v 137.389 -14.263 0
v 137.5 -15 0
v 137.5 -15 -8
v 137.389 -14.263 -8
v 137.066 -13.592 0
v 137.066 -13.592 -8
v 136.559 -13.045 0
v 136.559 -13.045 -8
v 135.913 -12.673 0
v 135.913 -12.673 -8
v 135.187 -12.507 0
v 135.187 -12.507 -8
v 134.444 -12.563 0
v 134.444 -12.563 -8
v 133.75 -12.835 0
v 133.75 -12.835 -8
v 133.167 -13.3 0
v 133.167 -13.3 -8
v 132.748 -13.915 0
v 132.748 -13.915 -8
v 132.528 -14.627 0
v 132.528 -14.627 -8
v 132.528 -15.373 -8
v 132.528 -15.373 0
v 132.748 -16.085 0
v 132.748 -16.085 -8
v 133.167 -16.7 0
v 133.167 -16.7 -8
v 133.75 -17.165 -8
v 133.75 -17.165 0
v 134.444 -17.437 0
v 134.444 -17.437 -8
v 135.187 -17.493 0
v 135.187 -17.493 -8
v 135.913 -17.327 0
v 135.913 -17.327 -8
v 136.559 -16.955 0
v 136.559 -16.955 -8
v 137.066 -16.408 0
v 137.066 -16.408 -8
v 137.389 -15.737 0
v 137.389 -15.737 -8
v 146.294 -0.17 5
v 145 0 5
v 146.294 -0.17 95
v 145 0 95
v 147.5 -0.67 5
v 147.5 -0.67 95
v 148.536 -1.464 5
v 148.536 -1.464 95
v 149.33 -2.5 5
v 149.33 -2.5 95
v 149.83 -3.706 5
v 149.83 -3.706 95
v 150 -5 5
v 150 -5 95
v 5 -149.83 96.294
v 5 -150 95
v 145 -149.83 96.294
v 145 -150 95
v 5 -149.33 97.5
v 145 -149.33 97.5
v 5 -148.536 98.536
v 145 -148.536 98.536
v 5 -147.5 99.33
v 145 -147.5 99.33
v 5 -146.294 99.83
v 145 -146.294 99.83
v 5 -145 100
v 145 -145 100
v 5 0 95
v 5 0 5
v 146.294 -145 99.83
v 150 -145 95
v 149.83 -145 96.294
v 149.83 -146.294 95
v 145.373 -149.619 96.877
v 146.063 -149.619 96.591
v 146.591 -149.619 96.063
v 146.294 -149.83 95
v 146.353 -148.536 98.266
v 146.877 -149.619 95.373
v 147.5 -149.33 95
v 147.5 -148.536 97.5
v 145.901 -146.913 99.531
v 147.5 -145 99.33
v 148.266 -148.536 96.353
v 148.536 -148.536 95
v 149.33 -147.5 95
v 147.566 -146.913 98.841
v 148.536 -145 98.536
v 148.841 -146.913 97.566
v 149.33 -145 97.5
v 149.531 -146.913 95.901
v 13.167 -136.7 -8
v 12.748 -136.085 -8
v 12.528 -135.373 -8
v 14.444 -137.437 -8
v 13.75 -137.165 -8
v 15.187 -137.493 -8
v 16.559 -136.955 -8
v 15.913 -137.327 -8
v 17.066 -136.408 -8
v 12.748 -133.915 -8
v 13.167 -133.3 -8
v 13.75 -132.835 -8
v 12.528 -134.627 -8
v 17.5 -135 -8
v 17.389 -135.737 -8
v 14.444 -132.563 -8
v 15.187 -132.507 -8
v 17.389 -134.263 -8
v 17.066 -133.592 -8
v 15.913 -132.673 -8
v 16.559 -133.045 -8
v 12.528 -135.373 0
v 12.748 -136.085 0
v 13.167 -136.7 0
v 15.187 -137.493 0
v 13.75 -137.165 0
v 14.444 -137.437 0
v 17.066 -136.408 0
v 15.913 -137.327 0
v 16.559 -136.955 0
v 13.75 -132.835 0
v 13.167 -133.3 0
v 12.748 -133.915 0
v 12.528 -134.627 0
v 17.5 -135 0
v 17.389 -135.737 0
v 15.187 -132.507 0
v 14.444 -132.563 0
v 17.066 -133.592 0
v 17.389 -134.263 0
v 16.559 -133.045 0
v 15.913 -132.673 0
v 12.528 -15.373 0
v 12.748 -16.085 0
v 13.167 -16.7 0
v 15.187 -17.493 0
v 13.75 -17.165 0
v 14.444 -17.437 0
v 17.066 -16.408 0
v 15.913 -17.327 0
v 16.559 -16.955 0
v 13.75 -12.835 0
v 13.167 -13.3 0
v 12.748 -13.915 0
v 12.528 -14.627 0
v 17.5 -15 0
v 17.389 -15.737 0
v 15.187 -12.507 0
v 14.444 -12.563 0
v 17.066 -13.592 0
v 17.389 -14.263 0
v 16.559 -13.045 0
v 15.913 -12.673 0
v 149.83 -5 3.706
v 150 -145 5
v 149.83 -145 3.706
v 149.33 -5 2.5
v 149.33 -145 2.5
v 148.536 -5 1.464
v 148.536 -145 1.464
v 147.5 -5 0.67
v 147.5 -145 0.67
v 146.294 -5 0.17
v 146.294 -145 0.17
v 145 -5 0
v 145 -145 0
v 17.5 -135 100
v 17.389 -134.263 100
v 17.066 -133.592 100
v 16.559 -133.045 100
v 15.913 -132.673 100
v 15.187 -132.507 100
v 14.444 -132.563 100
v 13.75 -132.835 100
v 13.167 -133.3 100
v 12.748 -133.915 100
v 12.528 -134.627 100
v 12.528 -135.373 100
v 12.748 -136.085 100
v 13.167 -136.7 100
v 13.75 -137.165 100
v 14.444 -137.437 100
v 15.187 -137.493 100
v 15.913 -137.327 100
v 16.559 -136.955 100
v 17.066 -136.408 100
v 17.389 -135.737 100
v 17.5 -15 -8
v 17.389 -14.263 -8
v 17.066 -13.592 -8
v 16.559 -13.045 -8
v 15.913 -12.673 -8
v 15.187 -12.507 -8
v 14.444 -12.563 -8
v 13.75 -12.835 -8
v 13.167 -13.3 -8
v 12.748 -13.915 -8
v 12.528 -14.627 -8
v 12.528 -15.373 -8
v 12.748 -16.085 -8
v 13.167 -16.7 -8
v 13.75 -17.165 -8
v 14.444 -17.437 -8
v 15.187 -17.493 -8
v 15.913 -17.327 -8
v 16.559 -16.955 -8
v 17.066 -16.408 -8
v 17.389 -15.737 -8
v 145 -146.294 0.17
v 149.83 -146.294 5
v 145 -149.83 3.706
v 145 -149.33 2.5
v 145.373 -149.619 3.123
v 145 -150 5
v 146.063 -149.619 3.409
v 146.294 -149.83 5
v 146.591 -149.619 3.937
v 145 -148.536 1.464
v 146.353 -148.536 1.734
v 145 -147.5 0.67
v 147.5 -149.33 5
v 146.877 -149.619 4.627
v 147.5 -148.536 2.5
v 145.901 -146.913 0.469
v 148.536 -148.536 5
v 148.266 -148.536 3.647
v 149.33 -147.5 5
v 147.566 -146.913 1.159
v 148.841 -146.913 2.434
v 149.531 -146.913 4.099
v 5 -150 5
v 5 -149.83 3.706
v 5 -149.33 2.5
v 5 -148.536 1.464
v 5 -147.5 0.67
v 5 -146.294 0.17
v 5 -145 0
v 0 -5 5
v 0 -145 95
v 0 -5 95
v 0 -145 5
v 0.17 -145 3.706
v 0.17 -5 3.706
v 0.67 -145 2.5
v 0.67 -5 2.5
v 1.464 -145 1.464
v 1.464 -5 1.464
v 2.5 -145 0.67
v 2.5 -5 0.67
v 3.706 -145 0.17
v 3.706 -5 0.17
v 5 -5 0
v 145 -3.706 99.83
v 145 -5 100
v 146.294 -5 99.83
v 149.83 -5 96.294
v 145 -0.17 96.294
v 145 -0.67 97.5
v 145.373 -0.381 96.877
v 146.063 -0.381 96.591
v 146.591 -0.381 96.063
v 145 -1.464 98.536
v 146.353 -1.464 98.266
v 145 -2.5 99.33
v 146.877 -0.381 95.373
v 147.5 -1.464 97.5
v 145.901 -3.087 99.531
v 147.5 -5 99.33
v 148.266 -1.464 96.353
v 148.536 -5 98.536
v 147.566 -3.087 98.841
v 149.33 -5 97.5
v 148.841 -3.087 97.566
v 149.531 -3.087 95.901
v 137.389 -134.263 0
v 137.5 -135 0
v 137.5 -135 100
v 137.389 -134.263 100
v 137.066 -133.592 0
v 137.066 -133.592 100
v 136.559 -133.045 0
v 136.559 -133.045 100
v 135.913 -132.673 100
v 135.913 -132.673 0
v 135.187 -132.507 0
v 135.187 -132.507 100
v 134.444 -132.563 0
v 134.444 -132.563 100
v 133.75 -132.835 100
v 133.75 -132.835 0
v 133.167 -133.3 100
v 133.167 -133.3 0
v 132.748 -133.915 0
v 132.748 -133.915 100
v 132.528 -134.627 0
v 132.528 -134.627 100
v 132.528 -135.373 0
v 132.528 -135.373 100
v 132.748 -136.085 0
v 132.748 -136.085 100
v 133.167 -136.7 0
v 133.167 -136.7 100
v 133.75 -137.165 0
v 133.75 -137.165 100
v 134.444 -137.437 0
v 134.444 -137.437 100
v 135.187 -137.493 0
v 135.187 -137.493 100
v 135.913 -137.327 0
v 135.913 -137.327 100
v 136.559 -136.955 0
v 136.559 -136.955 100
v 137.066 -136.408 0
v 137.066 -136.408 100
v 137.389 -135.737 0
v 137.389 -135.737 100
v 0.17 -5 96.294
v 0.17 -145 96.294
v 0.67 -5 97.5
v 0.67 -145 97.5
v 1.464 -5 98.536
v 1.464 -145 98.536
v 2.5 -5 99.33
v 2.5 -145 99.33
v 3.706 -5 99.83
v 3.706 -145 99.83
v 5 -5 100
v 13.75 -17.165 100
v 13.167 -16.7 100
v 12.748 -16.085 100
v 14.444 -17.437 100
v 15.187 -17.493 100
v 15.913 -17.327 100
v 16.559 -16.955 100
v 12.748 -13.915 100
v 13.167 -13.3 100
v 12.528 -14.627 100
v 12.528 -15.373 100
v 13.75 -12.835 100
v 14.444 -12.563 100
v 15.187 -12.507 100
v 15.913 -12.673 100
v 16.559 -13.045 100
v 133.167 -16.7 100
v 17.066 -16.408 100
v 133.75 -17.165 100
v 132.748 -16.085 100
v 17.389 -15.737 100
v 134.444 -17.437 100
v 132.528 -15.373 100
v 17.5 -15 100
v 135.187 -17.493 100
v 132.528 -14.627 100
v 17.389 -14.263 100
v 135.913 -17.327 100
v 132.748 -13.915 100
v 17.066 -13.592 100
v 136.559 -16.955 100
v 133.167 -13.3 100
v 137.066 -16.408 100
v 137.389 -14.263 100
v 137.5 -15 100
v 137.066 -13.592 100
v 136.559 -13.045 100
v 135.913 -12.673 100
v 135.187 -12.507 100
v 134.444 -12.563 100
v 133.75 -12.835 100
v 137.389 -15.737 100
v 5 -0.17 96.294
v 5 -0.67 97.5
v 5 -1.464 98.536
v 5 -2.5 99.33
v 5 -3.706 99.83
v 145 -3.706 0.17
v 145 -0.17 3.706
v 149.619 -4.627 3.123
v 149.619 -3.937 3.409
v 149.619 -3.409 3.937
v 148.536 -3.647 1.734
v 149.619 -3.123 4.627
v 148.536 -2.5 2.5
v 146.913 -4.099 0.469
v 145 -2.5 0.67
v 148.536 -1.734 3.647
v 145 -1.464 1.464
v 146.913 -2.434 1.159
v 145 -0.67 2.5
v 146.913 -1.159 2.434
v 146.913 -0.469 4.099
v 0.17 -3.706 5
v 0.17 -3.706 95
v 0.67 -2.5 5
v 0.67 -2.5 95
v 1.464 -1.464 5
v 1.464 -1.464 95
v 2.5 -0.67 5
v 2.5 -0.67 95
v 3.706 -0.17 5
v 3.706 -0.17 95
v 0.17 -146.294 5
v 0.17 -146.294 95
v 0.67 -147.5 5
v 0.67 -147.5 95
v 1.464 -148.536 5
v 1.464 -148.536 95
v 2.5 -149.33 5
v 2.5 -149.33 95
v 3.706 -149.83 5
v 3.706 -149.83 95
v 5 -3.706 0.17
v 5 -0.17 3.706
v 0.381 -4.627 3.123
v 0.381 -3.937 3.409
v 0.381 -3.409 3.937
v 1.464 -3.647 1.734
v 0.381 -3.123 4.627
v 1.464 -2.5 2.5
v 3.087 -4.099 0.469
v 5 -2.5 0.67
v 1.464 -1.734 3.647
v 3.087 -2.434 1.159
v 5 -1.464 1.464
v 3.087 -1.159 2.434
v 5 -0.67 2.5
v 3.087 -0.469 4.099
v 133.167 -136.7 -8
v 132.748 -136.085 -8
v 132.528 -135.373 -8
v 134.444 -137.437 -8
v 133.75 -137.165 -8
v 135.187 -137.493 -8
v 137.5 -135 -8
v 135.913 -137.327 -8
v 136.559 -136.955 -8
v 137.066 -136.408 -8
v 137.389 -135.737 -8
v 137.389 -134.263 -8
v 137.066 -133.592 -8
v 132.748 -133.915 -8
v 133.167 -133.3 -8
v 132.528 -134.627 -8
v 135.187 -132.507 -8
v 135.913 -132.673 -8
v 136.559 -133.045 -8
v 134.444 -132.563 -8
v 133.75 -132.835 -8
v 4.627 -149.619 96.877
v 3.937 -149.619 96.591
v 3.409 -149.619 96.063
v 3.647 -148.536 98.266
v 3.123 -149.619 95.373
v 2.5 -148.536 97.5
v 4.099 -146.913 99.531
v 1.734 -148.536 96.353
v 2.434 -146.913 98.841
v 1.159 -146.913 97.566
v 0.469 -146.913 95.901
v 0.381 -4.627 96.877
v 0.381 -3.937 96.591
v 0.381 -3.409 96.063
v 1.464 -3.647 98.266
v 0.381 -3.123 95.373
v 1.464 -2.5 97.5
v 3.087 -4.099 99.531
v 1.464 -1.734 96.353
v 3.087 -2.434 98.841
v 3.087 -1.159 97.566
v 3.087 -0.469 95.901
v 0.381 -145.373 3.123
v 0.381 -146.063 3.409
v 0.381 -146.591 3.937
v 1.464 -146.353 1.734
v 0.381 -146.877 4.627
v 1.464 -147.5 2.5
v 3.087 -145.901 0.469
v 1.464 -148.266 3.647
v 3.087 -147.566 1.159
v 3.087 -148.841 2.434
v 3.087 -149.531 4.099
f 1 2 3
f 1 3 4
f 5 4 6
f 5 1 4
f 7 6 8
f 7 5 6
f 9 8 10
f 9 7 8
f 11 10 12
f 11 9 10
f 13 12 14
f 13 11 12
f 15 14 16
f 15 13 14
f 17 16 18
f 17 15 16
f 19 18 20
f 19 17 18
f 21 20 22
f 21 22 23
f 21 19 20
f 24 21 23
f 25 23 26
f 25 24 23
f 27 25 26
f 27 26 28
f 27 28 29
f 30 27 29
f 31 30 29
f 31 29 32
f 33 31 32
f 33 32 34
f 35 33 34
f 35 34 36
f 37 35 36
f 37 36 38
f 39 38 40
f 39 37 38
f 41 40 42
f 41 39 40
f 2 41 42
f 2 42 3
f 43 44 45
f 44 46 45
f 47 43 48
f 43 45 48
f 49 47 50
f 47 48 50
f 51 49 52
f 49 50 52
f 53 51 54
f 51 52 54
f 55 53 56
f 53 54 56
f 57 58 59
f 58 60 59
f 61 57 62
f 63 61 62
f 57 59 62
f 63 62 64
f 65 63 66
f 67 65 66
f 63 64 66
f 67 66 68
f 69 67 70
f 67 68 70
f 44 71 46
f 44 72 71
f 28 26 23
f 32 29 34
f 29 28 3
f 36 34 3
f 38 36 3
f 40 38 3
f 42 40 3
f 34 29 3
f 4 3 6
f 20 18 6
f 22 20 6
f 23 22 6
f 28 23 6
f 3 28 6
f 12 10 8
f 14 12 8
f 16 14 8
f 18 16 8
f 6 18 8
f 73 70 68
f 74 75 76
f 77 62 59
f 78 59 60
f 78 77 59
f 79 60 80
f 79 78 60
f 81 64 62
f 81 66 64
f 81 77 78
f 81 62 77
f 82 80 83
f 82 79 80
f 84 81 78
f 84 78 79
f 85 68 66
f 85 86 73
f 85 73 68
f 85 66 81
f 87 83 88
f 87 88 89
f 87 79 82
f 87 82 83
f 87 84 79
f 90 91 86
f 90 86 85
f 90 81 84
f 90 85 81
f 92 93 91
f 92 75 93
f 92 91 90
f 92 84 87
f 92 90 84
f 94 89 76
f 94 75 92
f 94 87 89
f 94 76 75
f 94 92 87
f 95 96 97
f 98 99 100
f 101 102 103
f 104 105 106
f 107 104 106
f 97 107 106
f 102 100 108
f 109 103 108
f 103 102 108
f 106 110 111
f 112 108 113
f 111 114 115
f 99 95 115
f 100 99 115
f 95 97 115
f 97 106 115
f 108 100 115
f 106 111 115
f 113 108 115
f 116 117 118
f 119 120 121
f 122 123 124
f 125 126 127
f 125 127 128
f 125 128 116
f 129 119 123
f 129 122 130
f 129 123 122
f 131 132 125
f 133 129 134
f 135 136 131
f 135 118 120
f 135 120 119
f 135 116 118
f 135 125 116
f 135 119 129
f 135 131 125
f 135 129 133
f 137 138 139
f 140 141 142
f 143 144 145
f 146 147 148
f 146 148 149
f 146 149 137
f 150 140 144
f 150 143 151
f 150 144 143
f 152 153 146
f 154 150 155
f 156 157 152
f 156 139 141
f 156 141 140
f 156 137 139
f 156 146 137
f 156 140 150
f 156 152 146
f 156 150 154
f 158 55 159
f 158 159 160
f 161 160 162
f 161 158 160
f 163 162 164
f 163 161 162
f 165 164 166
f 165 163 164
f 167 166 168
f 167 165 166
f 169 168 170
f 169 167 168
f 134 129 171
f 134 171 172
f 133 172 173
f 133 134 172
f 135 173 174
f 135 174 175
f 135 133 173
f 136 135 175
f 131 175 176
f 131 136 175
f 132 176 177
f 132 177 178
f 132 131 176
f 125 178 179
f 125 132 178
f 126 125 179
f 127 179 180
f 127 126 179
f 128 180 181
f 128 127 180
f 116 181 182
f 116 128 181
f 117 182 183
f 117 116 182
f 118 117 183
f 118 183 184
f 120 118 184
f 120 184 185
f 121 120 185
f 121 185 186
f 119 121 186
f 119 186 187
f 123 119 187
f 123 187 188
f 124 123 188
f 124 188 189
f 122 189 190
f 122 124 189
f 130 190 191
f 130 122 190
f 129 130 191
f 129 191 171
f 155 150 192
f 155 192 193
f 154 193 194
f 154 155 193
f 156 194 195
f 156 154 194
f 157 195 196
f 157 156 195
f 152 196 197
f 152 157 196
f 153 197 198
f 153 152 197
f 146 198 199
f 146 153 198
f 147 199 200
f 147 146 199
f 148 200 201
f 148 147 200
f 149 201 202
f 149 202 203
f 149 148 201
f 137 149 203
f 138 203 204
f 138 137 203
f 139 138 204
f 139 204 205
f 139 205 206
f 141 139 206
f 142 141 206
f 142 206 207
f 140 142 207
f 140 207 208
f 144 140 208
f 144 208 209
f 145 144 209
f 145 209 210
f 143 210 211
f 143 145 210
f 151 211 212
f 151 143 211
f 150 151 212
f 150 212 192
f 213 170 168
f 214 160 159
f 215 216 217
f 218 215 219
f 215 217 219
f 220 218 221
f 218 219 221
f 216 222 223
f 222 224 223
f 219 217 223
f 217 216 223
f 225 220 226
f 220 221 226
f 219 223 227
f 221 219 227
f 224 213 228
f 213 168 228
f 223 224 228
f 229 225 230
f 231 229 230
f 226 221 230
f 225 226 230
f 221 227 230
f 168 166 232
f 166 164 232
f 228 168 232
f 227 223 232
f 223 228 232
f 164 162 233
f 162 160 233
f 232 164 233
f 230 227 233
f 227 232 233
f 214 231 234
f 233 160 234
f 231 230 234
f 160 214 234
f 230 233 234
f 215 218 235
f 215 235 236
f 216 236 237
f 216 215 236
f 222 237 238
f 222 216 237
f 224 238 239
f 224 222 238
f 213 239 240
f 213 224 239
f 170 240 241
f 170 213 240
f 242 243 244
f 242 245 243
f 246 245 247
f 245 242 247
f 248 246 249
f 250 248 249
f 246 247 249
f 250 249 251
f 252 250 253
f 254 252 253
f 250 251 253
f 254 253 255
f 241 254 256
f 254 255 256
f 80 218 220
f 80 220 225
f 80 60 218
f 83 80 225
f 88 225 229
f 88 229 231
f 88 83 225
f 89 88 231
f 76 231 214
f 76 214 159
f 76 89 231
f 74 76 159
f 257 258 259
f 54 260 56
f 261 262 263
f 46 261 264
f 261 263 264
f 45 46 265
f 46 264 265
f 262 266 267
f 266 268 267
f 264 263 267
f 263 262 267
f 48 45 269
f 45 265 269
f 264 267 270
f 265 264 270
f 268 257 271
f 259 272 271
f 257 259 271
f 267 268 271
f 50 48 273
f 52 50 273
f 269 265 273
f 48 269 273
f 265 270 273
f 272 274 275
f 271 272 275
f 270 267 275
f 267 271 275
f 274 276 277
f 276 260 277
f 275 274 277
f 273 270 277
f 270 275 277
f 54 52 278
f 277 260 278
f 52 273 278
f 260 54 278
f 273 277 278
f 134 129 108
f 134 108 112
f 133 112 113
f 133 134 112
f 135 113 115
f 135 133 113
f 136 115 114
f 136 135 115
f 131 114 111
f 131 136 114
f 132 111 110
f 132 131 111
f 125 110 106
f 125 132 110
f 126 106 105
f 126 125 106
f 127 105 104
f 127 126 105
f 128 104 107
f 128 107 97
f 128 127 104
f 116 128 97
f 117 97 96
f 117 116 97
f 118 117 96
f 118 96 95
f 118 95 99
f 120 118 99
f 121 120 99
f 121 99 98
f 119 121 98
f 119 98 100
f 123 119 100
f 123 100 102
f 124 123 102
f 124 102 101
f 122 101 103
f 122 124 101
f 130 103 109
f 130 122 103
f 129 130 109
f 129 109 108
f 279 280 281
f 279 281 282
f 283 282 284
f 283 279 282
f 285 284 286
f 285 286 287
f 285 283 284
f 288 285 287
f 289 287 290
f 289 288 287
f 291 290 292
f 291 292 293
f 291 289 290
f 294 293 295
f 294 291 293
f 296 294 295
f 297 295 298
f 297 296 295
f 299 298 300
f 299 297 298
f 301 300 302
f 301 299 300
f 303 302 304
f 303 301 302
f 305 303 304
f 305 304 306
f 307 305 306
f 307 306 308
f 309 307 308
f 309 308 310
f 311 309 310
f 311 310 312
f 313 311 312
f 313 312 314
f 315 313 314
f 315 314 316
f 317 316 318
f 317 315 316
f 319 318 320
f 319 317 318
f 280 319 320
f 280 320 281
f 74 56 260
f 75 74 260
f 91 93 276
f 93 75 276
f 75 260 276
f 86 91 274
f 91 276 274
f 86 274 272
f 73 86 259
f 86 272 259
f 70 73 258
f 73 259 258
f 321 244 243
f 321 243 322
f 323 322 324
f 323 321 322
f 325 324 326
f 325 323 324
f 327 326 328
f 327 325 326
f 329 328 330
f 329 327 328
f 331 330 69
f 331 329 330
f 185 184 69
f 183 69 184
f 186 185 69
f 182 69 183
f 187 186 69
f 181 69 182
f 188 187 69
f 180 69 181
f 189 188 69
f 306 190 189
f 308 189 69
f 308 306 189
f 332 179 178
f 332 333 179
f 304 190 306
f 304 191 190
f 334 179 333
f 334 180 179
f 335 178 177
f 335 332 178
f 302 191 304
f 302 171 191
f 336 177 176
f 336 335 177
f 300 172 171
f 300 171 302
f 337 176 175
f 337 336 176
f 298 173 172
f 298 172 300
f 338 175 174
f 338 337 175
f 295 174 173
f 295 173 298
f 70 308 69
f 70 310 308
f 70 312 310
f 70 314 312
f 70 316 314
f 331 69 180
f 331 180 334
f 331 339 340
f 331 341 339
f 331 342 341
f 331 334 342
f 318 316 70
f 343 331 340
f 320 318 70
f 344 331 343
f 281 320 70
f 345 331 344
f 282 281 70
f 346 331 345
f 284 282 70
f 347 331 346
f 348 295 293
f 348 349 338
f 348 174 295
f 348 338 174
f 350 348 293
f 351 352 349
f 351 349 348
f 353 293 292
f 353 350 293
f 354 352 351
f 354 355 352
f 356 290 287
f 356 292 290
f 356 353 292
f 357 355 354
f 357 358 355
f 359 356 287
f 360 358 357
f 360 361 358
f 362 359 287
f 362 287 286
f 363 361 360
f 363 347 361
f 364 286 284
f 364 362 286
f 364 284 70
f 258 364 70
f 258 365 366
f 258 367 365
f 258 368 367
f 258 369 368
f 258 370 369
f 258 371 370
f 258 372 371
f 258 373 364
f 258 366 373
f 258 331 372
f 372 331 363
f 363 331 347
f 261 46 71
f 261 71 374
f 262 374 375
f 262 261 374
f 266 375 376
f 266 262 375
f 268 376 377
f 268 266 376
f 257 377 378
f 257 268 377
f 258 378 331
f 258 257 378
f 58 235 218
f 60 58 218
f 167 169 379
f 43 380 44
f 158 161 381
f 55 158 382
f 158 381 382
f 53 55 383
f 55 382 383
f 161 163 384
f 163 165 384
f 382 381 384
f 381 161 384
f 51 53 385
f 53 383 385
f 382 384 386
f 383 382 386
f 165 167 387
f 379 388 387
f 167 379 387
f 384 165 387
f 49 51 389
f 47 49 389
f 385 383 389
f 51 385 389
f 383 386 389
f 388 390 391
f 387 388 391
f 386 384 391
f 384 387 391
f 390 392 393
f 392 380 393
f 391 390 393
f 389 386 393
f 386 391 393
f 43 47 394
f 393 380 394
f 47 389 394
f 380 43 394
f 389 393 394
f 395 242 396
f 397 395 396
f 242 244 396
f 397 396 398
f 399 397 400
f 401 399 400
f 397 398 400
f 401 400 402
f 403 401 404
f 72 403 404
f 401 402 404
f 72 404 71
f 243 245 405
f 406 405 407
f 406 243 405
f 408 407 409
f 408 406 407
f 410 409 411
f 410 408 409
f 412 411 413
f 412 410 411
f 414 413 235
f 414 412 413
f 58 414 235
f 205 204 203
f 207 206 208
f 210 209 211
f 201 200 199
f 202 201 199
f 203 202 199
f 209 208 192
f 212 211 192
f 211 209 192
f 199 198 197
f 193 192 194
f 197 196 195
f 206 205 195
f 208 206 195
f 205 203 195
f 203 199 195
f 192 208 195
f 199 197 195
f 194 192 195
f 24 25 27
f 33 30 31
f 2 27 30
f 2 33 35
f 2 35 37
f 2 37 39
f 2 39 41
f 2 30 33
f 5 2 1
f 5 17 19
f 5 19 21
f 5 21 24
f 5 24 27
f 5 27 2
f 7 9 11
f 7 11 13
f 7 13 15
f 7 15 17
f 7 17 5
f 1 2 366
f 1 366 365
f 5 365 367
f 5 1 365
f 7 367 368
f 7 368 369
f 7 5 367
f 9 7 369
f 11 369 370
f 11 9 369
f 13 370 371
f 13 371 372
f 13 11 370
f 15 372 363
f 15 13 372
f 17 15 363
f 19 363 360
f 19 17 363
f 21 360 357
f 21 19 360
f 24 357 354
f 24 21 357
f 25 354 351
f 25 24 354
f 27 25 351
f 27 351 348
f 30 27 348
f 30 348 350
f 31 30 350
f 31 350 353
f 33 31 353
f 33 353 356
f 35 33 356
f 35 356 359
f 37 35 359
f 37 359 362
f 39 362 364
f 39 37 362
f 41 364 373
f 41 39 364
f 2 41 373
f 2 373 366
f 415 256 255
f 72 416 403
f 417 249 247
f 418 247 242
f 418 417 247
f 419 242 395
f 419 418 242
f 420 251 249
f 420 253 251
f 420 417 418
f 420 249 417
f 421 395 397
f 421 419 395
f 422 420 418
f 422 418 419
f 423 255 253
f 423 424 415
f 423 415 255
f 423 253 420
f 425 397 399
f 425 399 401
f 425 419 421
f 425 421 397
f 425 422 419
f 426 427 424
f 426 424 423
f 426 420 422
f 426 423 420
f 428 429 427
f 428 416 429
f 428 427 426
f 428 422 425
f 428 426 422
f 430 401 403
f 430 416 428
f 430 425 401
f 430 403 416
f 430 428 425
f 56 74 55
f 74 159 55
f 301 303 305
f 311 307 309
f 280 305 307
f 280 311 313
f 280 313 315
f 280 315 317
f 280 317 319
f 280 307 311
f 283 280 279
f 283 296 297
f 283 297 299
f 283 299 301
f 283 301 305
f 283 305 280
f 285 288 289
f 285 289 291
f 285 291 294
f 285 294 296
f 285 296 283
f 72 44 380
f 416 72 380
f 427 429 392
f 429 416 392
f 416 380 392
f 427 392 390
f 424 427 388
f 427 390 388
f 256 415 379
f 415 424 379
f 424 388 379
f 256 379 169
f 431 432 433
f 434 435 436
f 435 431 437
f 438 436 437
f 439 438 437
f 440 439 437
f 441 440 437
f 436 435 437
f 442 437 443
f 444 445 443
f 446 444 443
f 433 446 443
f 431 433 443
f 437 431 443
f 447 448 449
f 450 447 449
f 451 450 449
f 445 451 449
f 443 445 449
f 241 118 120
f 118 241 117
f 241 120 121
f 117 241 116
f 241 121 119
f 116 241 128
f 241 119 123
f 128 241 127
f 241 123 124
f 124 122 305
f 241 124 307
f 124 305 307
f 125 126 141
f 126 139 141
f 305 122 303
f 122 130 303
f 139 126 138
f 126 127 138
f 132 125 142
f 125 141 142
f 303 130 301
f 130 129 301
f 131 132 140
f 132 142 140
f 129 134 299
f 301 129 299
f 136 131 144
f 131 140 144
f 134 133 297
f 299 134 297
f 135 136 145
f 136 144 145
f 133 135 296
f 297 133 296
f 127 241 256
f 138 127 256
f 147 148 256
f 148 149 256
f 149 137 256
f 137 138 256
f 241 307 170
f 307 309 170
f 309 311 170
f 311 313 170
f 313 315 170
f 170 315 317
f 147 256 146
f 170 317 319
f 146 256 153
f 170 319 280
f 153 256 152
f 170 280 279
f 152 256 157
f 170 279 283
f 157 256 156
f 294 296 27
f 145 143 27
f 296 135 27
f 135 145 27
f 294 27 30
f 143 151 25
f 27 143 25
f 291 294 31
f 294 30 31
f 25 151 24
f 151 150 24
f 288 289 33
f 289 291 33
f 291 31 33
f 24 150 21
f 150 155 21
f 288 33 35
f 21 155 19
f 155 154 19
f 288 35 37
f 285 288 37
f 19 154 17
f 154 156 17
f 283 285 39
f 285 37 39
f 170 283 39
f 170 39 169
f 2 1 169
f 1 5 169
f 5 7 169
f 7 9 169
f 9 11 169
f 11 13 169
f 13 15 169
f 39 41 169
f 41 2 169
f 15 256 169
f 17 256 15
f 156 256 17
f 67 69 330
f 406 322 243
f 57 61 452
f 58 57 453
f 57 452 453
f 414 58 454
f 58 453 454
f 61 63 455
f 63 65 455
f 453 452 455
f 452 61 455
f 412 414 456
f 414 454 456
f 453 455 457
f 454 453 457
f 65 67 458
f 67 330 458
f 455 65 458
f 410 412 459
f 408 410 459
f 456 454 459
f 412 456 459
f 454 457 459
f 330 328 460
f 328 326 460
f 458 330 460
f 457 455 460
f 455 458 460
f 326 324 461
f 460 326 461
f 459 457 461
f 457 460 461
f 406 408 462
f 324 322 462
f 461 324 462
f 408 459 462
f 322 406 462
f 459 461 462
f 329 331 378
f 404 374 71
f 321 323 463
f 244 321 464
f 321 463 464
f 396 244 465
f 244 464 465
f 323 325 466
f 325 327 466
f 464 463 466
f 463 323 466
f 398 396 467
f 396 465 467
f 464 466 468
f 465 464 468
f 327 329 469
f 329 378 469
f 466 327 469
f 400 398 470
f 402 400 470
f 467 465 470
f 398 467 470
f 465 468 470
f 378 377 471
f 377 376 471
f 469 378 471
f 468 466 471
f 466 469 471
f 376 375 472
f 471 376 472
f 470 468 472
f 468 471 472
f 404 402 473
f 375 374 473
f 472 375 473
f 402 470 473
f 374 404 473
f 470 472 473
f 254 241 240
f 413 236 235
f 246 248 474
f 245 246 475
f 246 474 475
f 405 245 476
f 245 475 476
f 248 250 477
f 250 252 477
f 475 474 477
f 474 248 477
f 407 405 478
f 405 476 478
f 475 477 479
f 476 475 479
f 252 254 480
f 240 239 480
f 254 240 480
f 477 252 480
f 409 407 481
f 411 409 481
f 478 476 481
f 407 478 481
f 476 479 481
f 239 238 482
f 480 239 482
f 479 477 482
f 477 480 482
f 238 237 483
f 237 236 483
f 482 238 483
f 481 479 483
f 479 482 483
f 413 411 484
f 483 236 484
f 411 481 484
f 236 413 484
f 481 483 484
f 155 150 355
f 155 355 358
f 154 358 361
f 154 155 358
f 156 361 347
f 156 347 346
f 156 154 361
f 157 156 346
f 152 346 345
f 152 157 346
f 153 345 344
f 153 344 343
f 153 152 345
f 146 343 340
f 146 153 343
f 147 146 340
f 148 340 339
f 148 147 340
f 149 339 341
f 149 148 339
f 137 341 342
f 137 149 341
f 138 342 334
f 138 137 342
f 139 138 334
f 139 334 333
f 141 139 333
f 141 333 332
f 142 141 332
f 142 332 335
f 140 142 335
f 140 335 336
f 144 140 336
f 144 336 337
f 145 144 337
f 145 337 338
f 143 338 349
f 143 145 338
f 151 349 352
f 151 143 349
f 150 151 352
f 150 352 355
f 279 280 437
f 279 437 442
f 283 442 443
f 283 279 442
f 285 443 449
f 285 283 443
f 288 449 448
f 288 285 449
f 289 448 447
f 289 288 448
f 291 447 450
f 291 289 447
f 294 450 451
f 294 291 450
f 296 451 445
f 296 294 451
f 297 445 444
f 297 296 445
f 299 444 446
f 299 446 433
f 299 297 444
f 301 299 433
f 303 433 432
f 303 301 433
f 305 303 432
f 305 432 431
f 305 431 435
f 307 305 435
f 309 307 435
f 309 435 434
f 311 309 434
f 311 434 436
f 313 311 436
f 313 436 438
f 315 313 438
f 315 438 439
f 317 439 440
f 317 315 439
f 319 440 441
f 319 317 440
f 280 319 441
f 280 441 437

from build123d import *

# Parameters (mm, degrees)
SKETCH_1_W        = 150
SKETCH_1_H        = 150
SKETCH_1_R        = 2.5
EXTRUDE_1_DEPTH   = 100
FILLET_1_R        = 5
SKETCH_1_2_R      = 2.5
EXTRUDE_2_DEPTH   = 8
EXTRUDE_2_2_DEPTH = 8
EXTRUDE_2_3_DEPTH = 8
EXTRUDE_2_4_DEPTH = 8


with BuildPart() as part:
    # 스케치1 → 보스-돌출1 (new body)
    with BuildSketch(Plane.XY):
        with Locations((75, -75)):
            Rectangle(SKETCH_1_W, SKETCH_1_H)
        with Locations((15, -15)):
            Circle(SKETCH_1_R, mode=Mode.SUBTRACT)
        with Locations((15, -135)):
            Circle(SKETCH_1_R, mode=Mode.SUBTRACT)
        with Locations((135, -15)):
            Circle(SKETCH_1_R, mode=Mode.SUBTRACT)
        with Locations((135, -135)):
            Circle(SKETCH_1_R, mode=Mode.SUBTRACT)
    extrude(amount=EXTRUDE_1_DEPTH)

    # 필렛1
    fillet_1_edges = [part.edges().sort_by_distance(p)[0] for p in [
        (150, -75, 100),
        (75, 0, 100),
        (0, -75, 100),
        (75, 0, 0),
        (150, -75, 0),
        (75, -150, 0),
        (0, -75, 0),
        (75, -150, 100),
        (0, 0, 50),
        (150, 0, 50),
        (150, -150, 50),
        (0, -150, 50),
    ]]
    fillet(fillet_1_edges, radius=FILLET_1_R)


with BuildPart() as body_2:
    # 스케치1<2> → 보스-돌출2 (new body)
    with BuildSketch(Plane.XY):
        with Locations((15, -15)):
            Circle(SKETCH_1_2_R)
    extrude(amount=-EXTRUDE_2_DEPTH)


with BuildPart() as body_3:
    # 스케치1<2> → Extrude 2 2 (new body)
    with BuildSketch(Plane.XY):
        with Locations((15, -135)):
            Circle(SKETCH_1_2_R)
    extrude(amount=-EXTRUDE_2_2_DEPTH)


with BuildPart() as body_4:
    # 스케치1<2> → Extrude 2 3 (new body)
    with BuildSketch(Plane.XY):
        with Locations((135, -15)):
            Circle(SKETCH_1_2_R)
    extrude(amount=-EXTRUDE_2_3_DEPTH)


with BuildPart() as body_5:
    # 스케치1<2> → Extrude 2 4 (new body)
    with BuildSketch(Plane.XY):
        with Locations((135, -135)):
            Circle(SKETCH_1_2_R)
    extrude(amount=-EXTRUDE_2_4_DEPTH)


solid = Compound([part.part, body_2.part, body_3.part, body_4.part, body_5.part])
